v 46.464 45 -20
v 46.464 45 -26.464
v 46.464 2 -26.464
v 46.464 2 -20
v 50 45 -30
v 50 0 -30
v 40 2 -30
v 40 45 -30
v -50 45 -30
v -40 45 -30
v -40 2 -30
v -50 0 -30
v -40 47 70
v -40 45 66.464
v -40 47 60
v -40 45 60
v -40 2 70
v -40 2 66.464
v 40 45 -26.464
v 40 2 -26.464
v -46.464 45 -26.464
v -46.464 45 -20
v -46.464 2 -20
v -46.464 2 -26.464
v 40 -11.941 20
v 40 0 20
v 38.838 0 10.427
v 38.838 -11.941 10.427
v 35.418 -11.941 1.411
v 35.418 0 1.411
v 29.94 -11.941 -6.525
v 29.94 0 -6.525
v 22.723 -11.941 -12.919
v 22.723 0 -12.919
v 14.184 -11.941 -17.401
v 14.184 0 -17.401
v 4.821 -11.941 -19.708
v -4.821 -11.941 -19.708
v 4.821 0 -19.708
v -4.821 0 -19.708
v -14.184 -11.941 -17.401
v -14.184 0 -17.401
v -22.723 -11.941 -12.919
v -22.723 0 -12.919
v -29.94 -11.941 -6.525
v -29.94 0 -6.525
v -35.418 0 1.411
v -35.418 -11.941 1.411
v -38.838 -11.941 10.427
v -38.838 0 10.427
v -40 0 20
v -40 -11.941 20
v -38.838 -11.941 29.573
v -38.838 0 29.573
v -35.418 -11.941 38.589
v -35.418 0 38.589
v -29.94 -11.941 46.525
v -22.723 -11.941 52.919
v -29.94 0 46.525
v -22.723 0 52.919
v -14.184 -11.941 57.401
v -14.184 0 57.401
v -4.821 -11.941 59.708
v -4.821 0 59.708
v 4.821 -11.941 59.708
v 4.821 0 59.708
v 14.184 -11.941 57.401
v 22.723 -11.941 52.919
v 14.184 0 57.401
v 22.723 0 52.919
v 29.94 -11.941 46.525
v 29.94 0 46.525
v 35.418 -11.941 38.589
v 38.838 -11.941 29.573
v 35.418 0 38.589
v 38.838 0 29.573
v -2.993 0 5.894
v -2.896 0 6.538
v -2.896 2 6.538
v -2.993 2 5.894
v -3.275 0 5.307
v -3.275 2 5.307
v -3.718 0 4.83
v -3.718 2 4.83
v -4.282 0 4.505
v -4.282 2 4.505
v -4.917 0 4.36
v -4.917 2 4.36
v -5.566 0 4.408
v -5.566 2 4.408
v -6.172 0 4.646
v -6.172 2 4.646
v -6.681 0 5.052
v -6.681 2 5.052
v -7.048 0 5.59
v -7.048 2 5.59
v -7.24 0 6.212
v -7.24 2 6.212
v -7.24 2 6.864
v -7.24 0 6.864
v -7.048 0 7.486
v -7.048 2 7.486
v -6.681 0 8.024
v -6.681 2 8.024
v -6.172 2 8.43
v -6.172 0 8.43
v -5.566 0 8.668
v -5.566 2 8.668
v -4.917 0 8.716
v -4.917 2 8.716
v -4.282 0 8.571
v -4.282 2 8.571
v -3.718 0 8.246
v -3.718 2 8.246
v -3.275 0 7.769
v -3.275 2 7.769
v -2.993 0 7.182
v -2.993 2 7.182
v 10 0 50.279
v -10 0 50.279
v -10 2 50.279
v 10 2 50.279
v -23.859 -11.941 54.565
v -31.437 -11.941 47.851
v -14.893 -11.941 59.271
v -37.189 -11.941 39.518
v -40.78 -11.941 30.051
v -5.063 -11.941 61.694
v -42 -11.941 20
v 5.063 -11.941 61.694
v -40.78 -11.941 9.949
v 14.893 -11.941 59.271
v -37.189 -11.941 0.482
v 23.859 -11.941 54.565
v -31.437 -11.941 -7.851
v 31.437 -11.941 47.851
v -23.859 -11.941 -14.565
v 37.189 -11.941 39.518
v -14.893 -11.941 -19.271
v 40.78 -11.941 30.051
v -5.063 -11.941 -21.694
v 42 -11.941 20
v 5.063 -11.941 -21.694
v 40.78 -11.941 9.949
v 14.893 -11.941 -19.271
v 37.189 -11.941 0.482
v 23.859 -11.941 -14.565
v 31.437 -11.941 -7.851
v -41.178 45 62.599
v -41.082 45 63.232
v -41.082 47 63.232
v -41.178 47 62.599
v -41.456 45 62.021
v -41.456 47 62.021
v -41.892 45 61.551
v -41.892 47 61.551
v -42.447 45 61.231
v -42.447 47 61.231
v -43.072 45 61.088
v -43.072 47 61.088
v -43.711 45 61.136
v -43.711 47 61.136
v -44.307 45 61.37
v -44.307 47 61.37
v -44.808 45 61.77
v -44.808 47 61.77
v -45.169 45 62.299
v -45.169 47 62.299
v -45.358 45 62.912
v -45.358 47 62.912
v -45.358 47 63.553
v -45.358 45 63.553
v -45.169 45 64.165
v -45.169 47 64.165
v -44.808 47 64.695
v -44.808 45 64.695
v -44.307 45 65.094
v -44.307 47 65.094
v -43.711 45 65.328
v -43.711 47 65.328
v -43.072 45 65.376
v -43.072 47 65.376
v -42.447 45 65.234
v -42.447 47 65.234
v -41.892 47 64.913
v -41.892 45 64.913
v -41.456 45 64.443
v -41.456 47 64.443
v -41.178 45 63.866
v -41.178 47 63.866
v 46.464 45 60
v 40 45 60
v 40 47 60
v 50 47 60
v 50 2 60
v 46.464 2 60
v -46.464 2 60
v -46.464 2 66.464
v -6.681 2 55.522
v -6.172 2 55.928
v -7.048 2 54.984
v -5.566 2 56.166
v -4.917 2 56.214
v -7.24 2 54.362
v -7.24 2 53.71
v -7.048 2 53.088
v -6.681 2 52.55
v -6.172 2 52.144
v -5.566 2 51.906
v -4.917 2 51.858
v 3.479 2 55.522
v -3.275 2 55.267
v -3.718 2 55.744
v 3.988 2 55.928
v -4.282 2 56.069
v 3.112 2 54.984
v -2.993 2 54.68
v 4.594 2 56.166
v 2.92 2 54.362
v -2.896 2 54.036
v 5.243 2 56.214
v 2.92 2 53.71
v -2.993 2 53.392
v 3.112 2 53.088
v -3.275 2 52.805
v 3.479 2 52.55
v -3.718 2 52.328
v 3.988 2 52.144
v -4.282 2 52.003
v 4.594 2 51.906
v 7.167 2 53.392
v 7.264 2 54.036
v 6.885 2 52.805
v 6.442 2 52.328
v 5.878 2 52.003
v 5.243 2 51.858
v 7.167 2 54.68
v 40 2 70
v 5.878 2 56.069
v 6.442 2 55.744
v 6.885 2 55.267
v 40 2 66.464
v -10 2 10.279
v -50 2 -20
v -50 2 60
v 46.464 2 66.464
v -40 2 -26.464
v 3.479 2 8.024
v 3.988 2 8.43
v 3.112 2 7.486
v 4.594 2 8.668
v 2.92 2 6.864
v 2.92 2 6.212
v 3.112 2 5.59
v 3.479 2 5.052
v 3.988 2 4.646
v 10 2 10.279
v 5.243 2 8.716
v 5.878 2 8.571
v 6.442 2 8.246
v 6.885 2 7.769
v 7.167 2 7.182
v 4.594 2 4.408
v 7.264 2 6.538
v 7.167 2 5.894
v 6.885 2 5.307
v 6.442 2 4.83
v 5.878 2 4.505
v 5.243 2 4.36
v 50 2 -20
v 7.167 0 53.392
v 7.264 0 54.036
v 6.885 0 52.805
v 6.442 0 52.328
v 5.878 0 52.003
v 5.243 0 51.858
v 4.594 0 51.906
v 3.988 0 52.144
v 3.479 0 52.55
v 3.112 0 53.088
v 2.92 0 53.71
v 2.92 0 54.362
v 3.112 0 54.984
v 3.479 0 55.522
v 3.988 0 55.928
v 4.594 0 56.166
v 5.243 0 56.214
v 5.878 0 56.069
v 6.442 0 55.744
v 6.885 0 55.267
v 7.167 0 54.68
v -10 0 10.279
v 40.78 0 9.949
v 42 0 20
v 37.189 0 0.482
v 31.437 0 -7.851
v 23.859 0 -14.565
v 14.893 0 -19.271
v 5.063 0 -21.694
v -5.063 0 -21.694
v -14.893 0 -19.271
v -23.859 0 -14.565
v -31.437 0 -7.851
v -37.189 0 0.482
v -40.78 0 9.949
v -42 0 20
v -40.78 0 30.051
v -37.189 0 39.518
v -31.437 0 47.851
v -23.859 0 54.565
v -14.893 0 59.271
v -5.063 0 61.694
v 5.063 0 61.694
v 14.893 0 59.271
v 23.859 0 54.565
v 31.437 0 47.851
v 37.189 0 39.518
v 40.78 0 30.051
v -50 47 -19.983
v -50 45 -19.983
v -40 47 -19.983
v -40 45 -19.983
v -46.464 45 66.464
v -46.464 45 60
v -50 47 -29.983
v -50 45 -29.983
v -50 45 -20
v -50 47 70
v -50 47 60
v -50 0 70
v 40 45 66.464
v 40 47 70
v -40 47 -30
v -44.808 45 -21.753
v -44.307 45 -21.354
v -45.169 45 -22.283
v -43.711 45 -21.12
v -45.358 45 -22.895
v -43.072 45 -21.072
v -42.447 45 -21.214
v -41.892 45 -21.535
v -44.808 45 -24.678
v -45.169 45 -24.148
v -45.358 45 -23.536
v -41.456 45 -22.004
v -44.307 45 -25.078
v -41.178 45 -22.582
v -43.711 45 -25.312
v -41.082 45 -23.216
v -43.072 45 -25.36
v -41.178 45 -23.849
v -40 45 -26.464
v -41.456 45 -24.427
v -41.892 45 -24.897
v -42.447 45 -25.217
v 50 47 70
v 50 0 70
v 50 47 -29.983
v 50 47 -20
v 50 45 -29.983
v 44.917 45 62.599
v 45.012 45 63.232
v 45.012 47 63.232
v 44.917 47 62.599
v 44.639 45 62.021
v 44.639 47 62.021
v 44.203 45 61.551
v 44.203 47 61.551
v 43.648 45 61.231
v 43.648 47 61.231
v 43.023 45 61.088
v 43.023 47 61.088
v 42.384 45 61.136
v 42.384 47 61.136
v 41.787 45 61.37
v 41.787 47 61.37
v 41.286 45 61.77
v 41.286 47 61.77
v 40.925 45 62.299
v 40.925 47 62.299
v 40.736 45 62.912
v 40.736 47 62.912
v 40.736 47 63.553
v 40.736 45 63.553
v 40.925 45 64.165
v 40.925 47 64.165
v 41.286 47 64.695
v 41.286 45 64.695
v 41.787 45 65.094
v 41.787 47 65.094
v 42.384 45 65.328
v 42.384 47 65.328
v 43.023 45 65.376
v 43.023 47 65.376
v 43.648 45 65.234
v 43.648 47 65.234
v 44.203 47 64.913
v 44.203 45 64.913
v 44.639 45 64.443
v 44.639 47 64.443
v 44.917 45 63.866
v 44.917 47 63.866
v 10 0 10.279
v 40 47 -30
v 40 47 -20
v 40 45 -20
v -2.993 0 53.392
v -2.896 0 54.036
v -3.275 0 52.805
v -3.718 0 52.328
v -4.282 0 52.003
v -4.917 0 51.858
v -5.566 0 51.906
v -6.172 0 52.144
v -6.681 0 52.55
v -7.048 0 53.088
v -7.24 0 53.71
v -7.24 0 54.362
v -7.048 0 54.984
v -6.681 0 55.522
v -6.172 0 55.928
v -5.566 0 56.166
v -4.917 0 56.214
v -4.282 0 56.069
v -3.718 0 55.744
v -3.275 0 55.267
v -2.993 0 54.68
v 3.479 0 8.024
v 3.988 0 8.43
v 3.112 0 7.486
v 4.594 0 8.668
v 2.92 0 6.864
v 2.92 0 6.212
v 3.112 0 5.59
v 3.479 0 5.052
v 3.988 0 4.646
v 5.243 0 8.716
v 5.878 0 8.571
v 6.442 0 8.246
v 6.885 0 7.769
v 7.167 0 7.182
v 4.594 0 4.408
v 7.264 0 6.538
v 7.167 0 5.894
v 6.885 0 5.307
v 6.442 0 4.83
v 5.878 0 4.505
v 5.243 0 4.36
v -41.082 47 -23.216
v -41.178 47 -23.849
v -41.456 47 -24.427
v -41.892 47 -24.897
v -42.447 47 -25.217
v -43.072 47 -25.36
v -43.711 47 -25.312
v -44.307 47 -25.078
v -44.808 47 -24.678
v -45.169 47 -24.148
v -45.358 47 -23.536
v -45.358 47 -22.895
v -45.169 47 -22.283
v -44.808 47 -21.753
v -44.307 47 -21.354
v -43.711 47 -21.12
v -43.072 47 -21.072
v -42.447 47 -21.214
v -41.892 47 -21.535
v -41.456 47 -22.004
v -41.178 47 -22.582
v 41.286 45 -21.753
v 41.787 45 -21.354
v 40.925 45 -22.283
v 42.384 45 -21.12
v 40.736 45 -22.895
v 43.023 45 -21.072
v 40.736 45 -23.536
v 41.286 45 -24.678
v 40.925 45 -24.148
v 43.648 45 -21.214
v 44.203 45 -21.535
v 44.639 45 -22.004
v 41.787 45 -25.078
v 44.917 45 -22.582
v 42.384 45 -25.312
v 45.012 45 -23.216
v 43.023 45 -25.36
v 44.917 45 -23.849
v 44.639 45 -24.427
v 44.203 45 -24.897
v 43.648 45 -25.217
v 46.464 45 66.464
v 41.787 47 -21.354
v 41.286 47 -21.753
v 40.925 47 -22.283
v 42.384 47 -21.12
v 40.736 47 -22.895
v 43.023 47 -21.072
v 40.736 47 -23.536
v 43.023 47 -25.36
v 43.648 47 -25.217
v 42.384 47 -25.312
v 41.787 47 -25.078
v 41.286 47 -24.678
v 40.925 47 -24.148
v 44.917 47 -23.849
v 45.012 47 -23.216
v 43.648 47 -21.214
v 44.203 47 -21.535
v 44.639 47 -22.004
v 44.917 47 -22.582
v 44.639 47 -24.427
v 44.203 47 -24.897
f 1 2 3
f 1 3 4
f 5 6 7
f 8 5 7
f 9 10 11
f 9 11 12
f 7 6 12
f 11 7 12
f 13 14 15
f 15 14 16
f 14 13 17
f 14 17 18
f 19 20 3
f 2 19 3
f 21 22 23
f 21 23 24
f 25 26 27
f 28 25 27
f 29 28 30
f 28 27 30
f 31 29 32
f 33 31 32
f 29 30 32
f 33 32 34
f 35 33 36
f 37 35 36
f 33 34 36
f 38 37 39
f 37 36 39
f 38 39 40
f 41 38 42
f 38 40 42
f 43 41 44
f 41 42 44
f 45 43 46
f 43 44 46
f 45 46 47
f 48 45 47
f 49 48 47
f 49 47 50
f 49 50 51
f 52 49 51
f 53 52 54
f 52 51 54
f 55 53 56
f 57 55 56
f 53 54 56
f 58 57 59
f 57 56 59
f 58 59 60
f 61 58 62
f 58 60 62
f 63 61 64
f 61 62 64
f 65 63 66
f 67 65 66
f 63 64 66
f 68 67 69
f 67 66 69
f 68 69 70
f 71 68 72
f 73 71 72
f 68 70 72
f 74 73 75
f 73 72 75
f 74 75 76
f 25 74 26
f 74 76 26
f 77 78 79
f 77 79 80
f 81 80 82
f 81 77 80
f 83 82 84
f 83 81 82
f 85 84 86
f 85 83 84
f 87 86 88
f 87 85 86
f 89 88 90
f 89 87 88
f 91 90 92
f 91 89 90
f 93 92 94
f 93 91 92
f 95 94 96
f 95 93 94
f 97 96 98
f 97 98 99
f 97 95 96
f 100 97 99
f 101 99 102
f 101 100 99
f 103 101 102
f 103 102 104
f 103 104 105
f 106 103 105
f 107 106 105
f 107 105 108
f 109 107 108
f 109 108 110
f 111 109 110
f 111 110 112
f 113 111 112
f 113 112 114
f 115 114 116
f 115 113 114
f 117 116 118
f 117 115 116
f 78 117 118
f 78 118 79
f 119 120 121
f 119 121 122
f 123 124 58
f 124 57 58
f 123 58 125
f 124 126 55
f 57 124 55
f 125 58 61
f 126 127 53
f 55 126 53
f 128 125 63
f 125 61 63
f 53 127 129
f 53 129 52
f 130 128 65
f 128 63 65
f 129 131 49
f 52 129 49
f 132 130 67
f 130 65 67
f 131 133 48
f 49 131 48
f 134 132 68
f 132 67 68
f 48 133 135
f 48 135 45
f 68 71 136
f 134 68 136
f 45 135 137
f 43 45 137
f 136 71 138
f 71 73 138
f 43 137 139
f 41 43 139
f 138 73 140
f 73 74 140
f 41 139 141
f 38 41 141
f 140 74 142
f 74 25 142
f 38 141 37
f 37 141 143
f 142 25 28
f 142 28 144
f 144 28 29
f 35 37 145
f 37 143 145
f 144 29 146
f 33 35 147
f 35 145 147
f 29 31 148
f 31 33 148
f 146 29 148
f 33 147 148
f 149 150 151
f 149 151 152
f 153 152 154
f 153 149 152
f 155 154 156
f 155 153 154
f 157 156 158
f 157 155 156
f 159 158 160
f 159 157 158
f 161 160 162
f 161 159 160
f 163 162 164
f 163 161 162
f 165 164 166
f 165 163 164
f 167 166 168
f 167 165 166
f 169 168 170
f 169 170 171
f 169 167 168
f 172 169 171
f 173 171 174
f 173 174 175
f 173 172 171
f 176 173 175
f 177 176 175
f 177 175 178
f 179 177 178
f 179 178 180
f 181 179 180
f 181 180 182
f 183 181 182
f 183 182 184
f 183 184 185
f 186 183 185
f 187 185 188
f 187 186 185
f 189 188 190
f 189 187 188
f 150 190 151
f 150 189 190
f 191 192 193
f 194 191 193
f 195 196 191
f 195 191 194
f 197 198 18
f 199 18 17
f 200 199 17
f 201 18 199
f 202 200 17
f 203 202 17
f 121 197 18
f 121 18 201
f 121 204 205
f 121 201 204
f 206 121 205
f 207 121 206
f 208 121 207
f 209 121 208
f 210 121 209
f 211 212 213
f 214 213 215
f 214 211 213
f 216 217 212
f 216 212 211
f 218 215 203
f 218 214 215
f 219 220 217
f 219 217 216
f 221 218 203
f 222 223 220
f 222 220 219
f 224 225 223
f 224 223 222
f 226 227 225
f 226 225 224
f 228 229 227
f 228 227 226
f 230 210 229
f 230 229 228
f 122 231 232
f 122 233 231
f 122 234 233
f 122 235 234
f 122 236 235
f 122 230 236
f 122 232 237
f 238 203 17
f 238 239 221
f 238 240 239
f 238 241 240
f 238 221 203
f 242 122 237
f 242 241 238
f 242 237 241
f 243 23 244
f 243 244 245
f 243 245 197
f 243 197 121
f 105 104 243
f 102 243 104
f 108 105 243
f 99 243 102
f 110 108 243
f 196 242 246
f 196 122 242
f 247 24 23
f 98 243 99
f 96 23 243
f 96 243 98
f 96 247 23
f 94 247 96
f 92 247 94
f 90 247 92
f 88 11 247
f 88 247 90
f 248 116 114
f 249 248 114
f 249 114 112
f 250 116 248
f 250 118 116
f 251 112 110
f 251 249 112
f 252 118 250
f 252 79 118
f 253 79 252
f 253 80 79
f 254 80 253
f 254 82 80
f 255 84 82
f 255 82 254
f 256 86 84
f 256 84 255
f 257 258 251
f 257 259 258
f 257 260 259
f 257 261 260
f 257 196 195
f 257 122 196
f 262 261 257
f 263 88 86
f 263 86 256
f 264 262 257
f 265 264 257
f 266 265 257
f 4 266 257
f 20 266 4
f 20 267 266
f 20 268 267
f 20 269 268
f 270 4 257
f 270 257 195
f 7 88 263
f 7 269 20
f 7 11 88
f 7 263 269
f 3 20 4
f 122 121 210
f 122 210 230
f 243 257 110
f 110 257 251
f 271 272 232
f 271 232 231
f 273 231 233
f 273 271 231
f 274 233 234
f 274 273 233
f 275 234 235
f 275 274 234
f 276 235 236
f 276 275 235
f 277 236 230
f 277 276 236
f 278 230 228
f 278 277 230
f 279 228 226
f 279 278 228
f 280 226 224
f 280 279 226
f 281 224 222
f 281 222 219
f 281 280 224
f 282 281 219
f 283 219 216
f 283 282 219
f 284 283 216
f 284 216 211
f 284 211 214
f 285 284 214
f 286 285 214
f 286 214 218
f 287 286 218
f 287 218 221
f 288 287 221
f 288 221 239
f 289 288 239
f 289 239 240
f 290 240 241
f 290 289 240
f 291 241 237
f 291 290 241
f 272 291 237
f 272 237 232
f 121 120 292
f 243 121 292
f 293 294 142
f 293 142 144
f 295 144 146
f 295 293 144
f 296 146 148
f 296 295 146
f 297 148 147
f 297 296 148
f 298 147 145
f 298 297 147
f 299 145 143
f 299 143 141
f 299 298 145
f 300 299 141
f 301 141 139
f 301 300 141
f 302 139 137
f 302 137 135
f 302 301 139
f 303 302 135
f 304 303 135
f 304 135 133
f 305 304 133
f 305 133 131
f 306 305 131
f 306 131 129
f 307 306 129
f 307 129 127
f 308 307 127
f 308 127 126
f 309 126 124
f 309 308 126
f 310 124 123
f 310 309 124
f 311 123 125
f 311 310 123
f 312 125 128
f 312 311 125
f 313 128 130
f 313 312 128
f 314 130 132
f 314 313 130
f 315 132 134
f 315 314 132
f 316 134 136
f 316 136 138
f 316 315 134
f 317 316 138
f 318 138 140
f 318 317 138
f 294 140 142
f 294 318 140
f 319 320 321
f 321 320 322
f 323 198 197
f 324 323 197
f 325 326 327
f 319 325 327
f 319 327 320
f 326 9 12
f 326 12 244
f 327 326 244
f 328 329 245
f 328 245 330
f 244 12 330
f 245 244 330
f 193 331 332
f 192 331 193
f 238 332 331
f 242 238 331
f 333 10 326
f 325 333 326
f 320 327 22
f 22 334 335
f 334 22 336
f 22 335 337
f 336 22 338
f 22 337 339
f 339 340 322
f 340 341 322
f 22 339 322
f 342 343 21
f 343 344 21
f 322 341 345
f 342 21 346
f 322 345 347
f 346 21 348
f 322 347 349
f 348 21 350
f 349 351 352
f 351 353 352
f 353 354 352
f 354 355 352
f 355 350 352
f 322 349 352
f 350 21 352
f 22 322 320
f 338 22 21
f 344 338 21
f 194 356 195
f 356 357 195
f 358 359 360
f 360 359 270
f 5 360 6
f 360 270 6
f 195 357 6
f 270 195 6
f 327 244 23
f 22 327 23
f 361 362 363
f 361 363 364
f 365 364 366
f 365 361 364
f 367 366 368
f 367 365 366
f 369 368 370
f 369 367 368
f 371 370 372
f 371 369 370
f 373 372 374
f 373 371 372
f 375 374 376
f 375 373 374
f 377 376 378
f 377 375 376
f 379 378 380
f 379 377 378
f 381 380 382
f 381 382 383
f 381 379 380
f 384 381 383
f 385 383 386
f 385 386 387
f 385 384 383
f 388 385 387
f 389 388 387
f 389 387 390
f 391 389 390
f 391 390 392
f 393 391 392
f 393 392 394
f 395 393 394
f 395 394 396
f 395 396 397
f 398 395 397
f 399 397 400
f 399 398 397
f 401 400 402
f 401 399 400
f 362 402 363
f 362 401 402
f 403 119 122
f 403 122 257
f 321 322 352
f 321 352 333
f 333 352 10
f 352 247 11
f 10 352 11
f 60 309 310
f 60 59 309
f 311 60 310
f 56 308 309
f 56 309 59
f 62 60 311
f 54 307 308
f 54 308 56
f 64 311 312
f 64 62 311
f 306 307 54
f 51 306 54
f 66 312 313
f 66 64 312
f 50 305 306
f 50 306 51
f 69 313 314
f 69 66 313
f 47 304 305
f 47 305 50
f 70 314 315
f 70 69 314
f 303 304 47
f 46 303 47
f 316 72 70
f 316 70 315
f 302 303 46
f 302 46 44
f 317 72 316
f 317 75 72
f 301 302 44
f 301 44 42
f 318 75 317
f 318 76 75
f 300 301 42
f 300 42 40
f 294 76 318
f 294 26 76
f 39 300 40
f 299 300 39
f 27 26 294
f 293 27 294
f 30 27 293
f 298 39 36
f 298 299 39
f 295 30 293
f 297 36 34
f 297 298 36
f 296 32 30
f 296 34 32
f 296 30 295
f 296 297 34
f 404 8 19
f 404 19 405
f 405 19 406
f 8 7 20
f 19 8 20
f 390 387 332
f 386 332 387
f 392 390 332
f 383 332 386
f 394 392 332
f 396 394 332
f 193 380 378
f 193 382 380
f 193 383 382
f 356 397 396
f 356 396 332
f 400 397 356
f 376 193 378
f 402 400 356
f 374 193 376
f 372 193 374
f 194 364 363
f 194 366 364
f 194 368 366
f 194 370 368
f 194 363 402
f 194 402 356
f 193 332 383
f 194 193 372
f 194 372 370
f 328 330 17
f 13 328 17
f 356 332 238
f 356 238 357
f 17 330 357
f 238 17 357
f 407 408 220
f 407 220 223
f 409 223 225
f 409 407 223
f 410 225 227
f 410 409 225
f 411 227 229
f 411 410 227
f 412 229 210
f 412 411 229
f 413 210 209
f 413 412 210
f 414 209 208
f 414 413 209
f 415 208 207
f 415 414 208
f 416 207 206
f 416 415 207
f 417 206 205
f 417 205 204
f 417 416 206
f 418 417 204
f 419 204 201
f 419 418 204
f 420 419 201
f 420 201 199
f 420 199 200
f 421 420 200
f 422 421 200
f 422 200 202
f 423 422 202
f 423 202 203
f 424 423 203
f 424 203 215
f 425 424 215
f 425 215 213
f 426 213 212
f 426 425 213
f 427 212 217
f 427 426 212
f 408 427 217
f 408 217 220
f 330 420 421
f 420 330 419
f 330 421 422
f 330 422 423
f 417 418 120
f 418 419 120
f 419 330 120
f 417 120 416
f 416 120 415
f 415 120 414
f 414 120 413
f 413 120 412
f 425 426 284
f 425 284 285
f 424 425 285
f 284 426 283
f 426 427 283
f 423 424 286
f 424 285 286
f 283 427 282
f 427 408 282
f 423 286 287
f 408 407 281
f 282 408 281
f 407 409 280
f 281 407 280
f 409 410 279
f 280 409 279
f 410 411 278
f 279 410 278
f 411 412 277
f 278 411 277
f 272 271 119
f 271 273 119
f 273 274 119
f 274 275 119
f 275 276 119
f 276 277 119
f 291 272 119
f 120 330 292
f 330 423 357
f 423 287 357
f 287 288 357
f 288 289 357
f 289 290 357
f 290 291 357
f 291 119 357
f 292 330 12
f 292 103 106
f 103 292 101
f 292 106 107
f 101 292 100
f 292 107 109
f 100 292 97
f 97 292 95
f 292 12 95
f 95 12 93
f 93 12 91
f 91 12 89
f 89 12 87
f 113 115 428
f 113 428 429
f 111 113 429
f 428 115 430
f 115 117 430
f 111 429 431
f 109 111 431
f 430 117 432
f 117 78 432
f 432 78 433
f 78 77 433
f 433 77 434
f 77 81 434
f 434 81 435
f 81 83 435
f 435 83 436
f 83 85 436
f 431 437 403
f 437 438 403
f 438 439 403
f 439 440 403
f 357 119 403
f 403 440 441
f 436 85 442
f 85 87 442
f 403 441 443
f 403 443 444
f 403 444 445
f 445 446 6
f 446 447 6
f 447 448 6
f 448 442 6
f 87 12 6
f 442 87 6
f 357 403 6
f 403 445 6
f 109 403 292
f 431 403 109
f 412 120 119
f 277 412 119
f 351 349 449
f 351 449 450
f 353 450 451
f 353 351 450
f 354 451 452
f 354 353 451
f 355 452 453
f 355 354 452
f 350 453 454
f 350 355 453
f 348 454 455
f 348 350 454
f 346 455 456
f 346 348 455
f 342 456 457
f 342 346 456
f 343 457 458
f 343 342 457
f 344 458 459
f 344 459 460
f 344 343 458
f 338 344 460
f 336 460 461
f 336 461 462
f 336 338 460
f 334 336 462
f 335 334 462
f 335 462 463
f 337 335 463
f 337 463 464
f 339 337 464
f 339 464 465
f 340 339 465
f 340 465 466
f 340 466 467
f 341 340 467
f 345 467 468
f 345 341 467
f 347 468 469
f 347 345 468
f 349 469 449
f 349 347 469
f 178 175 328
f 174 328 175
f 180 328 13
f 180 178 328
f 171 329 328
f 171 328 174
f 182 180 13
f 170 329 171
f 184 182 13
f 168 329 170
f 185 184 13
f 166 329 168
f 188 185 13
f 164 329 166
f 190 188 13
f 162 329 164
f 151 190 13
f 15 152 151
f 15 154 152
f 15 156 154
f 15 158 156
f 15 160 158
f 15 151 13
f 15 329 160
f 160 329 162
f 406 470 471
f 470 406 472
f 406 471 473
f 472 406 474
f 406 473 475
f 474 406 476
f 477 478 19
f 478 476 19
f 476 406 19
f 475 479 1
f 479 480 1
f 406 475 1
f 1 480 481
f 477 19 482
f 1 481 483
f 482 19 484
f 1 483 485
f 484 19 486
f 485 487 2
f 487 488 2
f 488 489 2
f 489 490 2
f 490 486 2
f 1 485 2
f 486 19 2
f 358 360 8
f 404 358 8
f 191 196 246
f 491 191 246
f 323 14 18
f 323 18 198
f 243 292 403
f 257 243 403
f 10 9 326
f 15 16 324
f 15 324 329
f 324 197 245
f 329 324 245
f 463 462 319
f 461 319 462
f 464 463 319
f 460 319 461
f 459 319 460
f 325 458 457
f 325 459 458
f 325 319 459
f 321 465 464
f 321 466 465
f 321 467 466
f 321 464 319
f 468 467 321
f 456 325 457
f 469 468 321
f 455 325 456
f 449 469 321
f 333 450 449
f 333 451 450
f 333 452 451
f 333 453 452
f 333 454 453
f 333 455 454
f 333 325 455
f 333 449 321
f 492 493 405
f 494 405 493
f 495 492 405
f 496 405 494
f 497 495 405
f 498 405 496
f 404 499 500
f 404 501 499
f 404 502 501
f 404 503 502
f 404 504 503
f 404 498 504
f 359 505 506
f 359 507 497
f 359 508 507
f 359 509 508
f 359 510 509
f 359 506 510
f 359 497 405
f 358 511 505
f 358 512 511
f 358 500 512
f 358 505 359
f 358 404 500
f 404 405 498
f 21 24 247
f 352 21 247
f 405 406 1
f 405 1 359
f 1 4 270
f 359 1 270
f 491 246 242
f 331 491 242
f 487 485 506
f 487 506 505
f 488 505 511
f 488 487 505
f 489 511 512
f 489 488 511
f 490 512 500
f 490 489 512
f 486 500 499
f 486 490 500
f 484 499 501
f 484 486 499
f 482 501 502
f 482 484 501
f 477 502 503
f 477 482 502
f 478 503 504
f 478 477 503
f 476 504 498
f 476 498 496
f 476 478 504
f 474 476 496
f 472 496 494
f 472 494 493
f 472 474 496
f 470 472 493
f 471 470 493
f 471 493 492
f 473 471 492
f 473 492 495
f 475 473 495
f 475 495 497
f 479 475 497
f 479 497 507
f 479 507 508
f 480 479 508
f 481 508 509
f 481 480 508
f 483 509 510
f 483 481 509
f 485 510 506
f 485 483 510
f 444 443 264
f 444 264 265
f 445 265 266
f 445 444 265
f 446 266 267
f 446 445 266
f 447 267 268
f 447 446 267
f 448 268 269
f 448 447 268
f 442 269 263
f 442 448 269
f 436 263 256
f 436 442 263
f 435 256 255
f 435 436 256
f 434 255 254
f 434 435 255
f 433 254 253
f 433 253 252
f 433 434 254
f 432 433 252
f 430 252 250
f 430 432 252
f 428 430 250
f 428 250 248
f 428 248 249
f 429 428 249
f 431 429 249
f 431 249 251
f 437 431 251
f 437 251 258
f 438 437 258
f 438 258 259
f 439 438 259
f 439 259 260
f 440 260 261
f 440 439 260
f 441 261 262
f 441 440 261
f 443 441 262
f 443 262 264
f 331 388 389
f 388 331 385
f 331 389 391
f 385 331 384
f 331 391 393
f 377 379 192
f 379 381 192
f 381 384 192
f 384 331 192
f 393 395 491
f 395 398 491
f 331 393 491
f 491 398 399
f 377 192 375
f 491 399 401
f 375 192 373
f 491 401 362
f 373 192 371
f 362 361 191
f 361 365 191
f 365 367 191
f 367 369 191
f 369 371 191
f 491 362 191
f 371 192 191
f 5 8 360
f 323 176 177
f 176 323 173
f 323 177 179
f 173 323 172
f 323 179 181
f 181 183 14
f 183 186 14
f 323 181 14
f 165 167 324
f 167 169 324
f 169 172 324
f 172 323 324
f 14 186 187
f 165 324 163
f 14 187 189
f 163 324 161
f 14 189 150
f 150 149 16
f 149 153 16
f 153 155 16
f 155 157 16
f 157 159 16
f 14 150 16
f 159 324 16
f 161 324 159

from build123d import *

# Parameters (mm, degrees)
SKETCH1_R           = 2.1844
SKETCH1_W           = 20
SKETCH1_H           = 40
BOSS_EXTRUDE1_DEPTH = 2
BOSS_EXTRUDE2_DEPTH = 45
SKETCH2_W           = 10
SKETCH2_H           = 10
SKETCH2_R           = 2.15
BOSS_EXTRUDE3_DEPTH = 2
SKETCH1_4_R         = 42
SKETCH1_4_R_2       = 40
BOSS_EXTRUDE4_DEPTH = 11.9409


with BuildPart() as part:
    # Sketch1 → Boss-Extrude1 (new body)
    with BuildSketch(Plane(origin=(0, 0, 0), x_dir=(1, 0, 0), z_dir=(0, 1, 0))):
        Polygon((-46.464466094, -60), (-46.464466094, -66.464466094), (-40, -66.464466094), (-40, -70), (40, -70), (40, -66.464466094), (46.464466094, -66.464466094), (46.464466094, -60), (50, -60), (50, 20), (46.464466094, 20), (46.464466094, 26.464466094), (40, 26.464466094), (40, 30), (-40, 30), (-40, 26.464466094), (-46.464466094, 26.464466094), (-46.464466094, 20), (-50, 20), (-50, -60), align=None)
        with Locations((5.08, -6.538)):
            Circle(SKETCH1_R, mode=Mode.SUBTRACT)
        with Locations((-5.08, -54.036)):
            Circle(SKETCH1_R, mode=Mode.SUBTRACT)
        with Locations((5.08, -54.036)):
            Circle(SKETCH1_R, mode=Mode.SUBTRACT)
        with Locations((0, -30.278699998)):
            Rectangle(SKETCH1_W, SKETCH1_H, mode=Mode.SUBTRACT)
        with Locations((-5.08, -6.538)):
            Circle(SKETCH1_R, mode=Mode.SUBTRACT)
    extrude(amount=BOSS_EXTRUDE1_DEPTH)

    # Sketch1<3> → Boss-Extrude2 (add)
    with BuildSketch(Plane(origin=(0, 0, 0), x_dir=(1, 0, 0), z_dir=(0, 1, 0))):
        Polygon((-50, -60), (-50, -70), (-40, -70), (-40, -66.464466094), (-46.464466094, -66.464466094), (-46.464466094, -60), align=None)
        Polygon((40, -66.464466094), (40, -70), (50, -70), (50, -60), (46.464466094, -60), (46.464466094, -66.464466094), align=None)
        Polygon((-50, 30), (-50, 20), (-46.464466094, 20), (-46.464466094, 26.464466094), (-40, 26.464466094), (-40, 30), align=None)
        Polygon((46.464466094, 20), (50, 20), (50, 30), (40, 30), (40, 26.464466094), (46.464466094, 26.464466094), align=None)
    extrude(amount=BOSS_EXTRUDE2_DEPTH)

    # Sketch2 → Boss-Extrude3 (add)
    # profile 1 of 4: a face of its own
    with BuildSketch(Plane(origin=(0, 45, 0), x_dir=(1, 0, 0), z_dir=(0, 1, 0))):
        with Locations((45, -65)):
            Rectangle(SKETCH2_W, SKETCH2_H)
        with Locations((42.862206079, -63.232233047)):
            Circle(SKETCH2_R, mode=Mode.SUBTRACT)
    # profile 2 of 4: a face of its own
    with BuildSketch(Plane(origin=(0, 45, 0), x_dir=(1, 0, 0), z_dir=(0, 1, 0))):
        with Locations((-45, -65)):
            Rectangle(SKETCH2_W, SKETCH2_H)
        with Locations((-43.232233047, -63.232233047)):
            Circle(SKETCH2_R, mode=Mode.SUBTRACT)
    # profile 3 of 4: a face of its own
    with BuildSketch(Plane(origin=(0, 45, 0), x_dir=(1, 0, 0), z_dir=(0, 1, 0))):
        Polygon((-50, 29.983399997), (-50, 19.983399997), (-40, 19.983399997), (-40, 30), align=None)
        with Locations((-43.232233047, 23.215633044)):
            Circle(SKETCH2_R, mode=Mode.SUBTRACT)
    # profile 4 of 4: a face of its own
    with BuildSketch(Plane(origin=(0, 45, 0), x_dir=(1, 0, 0), z_dir=(0, 1, 0))):
        Polygon((50, 29.983399997), (40, 30), (40, 20), (50, 20), align=None)
        with Locations((42.862206079, 23.215633044)):
            Circle(SKETCH2_R, mode=Mode.SUBTRACT)
    extrude(amount=BOSS_EXTRUDE3_DEPTH)


with BuildPart() as body_2:
    # Sketch1<4> → Boss-Extrude4 (new body)
    with BuildSketch(Plane(origin=(0, 0, 0), x_dir=(1, 0, 0), z_dir=(0, 1, 0))):
        with Locations((0, -20)):
            Circle(SKETCH1_4_R)
        with Locations((0, -20)):
            Circle(SKETCH1_4_R_2, mode=Mode.SUBTRACT)
    extrude(amount=-BOSS_EXTRUDE4_DEPTH)


solid = Compound([part.part, body_2.part])
